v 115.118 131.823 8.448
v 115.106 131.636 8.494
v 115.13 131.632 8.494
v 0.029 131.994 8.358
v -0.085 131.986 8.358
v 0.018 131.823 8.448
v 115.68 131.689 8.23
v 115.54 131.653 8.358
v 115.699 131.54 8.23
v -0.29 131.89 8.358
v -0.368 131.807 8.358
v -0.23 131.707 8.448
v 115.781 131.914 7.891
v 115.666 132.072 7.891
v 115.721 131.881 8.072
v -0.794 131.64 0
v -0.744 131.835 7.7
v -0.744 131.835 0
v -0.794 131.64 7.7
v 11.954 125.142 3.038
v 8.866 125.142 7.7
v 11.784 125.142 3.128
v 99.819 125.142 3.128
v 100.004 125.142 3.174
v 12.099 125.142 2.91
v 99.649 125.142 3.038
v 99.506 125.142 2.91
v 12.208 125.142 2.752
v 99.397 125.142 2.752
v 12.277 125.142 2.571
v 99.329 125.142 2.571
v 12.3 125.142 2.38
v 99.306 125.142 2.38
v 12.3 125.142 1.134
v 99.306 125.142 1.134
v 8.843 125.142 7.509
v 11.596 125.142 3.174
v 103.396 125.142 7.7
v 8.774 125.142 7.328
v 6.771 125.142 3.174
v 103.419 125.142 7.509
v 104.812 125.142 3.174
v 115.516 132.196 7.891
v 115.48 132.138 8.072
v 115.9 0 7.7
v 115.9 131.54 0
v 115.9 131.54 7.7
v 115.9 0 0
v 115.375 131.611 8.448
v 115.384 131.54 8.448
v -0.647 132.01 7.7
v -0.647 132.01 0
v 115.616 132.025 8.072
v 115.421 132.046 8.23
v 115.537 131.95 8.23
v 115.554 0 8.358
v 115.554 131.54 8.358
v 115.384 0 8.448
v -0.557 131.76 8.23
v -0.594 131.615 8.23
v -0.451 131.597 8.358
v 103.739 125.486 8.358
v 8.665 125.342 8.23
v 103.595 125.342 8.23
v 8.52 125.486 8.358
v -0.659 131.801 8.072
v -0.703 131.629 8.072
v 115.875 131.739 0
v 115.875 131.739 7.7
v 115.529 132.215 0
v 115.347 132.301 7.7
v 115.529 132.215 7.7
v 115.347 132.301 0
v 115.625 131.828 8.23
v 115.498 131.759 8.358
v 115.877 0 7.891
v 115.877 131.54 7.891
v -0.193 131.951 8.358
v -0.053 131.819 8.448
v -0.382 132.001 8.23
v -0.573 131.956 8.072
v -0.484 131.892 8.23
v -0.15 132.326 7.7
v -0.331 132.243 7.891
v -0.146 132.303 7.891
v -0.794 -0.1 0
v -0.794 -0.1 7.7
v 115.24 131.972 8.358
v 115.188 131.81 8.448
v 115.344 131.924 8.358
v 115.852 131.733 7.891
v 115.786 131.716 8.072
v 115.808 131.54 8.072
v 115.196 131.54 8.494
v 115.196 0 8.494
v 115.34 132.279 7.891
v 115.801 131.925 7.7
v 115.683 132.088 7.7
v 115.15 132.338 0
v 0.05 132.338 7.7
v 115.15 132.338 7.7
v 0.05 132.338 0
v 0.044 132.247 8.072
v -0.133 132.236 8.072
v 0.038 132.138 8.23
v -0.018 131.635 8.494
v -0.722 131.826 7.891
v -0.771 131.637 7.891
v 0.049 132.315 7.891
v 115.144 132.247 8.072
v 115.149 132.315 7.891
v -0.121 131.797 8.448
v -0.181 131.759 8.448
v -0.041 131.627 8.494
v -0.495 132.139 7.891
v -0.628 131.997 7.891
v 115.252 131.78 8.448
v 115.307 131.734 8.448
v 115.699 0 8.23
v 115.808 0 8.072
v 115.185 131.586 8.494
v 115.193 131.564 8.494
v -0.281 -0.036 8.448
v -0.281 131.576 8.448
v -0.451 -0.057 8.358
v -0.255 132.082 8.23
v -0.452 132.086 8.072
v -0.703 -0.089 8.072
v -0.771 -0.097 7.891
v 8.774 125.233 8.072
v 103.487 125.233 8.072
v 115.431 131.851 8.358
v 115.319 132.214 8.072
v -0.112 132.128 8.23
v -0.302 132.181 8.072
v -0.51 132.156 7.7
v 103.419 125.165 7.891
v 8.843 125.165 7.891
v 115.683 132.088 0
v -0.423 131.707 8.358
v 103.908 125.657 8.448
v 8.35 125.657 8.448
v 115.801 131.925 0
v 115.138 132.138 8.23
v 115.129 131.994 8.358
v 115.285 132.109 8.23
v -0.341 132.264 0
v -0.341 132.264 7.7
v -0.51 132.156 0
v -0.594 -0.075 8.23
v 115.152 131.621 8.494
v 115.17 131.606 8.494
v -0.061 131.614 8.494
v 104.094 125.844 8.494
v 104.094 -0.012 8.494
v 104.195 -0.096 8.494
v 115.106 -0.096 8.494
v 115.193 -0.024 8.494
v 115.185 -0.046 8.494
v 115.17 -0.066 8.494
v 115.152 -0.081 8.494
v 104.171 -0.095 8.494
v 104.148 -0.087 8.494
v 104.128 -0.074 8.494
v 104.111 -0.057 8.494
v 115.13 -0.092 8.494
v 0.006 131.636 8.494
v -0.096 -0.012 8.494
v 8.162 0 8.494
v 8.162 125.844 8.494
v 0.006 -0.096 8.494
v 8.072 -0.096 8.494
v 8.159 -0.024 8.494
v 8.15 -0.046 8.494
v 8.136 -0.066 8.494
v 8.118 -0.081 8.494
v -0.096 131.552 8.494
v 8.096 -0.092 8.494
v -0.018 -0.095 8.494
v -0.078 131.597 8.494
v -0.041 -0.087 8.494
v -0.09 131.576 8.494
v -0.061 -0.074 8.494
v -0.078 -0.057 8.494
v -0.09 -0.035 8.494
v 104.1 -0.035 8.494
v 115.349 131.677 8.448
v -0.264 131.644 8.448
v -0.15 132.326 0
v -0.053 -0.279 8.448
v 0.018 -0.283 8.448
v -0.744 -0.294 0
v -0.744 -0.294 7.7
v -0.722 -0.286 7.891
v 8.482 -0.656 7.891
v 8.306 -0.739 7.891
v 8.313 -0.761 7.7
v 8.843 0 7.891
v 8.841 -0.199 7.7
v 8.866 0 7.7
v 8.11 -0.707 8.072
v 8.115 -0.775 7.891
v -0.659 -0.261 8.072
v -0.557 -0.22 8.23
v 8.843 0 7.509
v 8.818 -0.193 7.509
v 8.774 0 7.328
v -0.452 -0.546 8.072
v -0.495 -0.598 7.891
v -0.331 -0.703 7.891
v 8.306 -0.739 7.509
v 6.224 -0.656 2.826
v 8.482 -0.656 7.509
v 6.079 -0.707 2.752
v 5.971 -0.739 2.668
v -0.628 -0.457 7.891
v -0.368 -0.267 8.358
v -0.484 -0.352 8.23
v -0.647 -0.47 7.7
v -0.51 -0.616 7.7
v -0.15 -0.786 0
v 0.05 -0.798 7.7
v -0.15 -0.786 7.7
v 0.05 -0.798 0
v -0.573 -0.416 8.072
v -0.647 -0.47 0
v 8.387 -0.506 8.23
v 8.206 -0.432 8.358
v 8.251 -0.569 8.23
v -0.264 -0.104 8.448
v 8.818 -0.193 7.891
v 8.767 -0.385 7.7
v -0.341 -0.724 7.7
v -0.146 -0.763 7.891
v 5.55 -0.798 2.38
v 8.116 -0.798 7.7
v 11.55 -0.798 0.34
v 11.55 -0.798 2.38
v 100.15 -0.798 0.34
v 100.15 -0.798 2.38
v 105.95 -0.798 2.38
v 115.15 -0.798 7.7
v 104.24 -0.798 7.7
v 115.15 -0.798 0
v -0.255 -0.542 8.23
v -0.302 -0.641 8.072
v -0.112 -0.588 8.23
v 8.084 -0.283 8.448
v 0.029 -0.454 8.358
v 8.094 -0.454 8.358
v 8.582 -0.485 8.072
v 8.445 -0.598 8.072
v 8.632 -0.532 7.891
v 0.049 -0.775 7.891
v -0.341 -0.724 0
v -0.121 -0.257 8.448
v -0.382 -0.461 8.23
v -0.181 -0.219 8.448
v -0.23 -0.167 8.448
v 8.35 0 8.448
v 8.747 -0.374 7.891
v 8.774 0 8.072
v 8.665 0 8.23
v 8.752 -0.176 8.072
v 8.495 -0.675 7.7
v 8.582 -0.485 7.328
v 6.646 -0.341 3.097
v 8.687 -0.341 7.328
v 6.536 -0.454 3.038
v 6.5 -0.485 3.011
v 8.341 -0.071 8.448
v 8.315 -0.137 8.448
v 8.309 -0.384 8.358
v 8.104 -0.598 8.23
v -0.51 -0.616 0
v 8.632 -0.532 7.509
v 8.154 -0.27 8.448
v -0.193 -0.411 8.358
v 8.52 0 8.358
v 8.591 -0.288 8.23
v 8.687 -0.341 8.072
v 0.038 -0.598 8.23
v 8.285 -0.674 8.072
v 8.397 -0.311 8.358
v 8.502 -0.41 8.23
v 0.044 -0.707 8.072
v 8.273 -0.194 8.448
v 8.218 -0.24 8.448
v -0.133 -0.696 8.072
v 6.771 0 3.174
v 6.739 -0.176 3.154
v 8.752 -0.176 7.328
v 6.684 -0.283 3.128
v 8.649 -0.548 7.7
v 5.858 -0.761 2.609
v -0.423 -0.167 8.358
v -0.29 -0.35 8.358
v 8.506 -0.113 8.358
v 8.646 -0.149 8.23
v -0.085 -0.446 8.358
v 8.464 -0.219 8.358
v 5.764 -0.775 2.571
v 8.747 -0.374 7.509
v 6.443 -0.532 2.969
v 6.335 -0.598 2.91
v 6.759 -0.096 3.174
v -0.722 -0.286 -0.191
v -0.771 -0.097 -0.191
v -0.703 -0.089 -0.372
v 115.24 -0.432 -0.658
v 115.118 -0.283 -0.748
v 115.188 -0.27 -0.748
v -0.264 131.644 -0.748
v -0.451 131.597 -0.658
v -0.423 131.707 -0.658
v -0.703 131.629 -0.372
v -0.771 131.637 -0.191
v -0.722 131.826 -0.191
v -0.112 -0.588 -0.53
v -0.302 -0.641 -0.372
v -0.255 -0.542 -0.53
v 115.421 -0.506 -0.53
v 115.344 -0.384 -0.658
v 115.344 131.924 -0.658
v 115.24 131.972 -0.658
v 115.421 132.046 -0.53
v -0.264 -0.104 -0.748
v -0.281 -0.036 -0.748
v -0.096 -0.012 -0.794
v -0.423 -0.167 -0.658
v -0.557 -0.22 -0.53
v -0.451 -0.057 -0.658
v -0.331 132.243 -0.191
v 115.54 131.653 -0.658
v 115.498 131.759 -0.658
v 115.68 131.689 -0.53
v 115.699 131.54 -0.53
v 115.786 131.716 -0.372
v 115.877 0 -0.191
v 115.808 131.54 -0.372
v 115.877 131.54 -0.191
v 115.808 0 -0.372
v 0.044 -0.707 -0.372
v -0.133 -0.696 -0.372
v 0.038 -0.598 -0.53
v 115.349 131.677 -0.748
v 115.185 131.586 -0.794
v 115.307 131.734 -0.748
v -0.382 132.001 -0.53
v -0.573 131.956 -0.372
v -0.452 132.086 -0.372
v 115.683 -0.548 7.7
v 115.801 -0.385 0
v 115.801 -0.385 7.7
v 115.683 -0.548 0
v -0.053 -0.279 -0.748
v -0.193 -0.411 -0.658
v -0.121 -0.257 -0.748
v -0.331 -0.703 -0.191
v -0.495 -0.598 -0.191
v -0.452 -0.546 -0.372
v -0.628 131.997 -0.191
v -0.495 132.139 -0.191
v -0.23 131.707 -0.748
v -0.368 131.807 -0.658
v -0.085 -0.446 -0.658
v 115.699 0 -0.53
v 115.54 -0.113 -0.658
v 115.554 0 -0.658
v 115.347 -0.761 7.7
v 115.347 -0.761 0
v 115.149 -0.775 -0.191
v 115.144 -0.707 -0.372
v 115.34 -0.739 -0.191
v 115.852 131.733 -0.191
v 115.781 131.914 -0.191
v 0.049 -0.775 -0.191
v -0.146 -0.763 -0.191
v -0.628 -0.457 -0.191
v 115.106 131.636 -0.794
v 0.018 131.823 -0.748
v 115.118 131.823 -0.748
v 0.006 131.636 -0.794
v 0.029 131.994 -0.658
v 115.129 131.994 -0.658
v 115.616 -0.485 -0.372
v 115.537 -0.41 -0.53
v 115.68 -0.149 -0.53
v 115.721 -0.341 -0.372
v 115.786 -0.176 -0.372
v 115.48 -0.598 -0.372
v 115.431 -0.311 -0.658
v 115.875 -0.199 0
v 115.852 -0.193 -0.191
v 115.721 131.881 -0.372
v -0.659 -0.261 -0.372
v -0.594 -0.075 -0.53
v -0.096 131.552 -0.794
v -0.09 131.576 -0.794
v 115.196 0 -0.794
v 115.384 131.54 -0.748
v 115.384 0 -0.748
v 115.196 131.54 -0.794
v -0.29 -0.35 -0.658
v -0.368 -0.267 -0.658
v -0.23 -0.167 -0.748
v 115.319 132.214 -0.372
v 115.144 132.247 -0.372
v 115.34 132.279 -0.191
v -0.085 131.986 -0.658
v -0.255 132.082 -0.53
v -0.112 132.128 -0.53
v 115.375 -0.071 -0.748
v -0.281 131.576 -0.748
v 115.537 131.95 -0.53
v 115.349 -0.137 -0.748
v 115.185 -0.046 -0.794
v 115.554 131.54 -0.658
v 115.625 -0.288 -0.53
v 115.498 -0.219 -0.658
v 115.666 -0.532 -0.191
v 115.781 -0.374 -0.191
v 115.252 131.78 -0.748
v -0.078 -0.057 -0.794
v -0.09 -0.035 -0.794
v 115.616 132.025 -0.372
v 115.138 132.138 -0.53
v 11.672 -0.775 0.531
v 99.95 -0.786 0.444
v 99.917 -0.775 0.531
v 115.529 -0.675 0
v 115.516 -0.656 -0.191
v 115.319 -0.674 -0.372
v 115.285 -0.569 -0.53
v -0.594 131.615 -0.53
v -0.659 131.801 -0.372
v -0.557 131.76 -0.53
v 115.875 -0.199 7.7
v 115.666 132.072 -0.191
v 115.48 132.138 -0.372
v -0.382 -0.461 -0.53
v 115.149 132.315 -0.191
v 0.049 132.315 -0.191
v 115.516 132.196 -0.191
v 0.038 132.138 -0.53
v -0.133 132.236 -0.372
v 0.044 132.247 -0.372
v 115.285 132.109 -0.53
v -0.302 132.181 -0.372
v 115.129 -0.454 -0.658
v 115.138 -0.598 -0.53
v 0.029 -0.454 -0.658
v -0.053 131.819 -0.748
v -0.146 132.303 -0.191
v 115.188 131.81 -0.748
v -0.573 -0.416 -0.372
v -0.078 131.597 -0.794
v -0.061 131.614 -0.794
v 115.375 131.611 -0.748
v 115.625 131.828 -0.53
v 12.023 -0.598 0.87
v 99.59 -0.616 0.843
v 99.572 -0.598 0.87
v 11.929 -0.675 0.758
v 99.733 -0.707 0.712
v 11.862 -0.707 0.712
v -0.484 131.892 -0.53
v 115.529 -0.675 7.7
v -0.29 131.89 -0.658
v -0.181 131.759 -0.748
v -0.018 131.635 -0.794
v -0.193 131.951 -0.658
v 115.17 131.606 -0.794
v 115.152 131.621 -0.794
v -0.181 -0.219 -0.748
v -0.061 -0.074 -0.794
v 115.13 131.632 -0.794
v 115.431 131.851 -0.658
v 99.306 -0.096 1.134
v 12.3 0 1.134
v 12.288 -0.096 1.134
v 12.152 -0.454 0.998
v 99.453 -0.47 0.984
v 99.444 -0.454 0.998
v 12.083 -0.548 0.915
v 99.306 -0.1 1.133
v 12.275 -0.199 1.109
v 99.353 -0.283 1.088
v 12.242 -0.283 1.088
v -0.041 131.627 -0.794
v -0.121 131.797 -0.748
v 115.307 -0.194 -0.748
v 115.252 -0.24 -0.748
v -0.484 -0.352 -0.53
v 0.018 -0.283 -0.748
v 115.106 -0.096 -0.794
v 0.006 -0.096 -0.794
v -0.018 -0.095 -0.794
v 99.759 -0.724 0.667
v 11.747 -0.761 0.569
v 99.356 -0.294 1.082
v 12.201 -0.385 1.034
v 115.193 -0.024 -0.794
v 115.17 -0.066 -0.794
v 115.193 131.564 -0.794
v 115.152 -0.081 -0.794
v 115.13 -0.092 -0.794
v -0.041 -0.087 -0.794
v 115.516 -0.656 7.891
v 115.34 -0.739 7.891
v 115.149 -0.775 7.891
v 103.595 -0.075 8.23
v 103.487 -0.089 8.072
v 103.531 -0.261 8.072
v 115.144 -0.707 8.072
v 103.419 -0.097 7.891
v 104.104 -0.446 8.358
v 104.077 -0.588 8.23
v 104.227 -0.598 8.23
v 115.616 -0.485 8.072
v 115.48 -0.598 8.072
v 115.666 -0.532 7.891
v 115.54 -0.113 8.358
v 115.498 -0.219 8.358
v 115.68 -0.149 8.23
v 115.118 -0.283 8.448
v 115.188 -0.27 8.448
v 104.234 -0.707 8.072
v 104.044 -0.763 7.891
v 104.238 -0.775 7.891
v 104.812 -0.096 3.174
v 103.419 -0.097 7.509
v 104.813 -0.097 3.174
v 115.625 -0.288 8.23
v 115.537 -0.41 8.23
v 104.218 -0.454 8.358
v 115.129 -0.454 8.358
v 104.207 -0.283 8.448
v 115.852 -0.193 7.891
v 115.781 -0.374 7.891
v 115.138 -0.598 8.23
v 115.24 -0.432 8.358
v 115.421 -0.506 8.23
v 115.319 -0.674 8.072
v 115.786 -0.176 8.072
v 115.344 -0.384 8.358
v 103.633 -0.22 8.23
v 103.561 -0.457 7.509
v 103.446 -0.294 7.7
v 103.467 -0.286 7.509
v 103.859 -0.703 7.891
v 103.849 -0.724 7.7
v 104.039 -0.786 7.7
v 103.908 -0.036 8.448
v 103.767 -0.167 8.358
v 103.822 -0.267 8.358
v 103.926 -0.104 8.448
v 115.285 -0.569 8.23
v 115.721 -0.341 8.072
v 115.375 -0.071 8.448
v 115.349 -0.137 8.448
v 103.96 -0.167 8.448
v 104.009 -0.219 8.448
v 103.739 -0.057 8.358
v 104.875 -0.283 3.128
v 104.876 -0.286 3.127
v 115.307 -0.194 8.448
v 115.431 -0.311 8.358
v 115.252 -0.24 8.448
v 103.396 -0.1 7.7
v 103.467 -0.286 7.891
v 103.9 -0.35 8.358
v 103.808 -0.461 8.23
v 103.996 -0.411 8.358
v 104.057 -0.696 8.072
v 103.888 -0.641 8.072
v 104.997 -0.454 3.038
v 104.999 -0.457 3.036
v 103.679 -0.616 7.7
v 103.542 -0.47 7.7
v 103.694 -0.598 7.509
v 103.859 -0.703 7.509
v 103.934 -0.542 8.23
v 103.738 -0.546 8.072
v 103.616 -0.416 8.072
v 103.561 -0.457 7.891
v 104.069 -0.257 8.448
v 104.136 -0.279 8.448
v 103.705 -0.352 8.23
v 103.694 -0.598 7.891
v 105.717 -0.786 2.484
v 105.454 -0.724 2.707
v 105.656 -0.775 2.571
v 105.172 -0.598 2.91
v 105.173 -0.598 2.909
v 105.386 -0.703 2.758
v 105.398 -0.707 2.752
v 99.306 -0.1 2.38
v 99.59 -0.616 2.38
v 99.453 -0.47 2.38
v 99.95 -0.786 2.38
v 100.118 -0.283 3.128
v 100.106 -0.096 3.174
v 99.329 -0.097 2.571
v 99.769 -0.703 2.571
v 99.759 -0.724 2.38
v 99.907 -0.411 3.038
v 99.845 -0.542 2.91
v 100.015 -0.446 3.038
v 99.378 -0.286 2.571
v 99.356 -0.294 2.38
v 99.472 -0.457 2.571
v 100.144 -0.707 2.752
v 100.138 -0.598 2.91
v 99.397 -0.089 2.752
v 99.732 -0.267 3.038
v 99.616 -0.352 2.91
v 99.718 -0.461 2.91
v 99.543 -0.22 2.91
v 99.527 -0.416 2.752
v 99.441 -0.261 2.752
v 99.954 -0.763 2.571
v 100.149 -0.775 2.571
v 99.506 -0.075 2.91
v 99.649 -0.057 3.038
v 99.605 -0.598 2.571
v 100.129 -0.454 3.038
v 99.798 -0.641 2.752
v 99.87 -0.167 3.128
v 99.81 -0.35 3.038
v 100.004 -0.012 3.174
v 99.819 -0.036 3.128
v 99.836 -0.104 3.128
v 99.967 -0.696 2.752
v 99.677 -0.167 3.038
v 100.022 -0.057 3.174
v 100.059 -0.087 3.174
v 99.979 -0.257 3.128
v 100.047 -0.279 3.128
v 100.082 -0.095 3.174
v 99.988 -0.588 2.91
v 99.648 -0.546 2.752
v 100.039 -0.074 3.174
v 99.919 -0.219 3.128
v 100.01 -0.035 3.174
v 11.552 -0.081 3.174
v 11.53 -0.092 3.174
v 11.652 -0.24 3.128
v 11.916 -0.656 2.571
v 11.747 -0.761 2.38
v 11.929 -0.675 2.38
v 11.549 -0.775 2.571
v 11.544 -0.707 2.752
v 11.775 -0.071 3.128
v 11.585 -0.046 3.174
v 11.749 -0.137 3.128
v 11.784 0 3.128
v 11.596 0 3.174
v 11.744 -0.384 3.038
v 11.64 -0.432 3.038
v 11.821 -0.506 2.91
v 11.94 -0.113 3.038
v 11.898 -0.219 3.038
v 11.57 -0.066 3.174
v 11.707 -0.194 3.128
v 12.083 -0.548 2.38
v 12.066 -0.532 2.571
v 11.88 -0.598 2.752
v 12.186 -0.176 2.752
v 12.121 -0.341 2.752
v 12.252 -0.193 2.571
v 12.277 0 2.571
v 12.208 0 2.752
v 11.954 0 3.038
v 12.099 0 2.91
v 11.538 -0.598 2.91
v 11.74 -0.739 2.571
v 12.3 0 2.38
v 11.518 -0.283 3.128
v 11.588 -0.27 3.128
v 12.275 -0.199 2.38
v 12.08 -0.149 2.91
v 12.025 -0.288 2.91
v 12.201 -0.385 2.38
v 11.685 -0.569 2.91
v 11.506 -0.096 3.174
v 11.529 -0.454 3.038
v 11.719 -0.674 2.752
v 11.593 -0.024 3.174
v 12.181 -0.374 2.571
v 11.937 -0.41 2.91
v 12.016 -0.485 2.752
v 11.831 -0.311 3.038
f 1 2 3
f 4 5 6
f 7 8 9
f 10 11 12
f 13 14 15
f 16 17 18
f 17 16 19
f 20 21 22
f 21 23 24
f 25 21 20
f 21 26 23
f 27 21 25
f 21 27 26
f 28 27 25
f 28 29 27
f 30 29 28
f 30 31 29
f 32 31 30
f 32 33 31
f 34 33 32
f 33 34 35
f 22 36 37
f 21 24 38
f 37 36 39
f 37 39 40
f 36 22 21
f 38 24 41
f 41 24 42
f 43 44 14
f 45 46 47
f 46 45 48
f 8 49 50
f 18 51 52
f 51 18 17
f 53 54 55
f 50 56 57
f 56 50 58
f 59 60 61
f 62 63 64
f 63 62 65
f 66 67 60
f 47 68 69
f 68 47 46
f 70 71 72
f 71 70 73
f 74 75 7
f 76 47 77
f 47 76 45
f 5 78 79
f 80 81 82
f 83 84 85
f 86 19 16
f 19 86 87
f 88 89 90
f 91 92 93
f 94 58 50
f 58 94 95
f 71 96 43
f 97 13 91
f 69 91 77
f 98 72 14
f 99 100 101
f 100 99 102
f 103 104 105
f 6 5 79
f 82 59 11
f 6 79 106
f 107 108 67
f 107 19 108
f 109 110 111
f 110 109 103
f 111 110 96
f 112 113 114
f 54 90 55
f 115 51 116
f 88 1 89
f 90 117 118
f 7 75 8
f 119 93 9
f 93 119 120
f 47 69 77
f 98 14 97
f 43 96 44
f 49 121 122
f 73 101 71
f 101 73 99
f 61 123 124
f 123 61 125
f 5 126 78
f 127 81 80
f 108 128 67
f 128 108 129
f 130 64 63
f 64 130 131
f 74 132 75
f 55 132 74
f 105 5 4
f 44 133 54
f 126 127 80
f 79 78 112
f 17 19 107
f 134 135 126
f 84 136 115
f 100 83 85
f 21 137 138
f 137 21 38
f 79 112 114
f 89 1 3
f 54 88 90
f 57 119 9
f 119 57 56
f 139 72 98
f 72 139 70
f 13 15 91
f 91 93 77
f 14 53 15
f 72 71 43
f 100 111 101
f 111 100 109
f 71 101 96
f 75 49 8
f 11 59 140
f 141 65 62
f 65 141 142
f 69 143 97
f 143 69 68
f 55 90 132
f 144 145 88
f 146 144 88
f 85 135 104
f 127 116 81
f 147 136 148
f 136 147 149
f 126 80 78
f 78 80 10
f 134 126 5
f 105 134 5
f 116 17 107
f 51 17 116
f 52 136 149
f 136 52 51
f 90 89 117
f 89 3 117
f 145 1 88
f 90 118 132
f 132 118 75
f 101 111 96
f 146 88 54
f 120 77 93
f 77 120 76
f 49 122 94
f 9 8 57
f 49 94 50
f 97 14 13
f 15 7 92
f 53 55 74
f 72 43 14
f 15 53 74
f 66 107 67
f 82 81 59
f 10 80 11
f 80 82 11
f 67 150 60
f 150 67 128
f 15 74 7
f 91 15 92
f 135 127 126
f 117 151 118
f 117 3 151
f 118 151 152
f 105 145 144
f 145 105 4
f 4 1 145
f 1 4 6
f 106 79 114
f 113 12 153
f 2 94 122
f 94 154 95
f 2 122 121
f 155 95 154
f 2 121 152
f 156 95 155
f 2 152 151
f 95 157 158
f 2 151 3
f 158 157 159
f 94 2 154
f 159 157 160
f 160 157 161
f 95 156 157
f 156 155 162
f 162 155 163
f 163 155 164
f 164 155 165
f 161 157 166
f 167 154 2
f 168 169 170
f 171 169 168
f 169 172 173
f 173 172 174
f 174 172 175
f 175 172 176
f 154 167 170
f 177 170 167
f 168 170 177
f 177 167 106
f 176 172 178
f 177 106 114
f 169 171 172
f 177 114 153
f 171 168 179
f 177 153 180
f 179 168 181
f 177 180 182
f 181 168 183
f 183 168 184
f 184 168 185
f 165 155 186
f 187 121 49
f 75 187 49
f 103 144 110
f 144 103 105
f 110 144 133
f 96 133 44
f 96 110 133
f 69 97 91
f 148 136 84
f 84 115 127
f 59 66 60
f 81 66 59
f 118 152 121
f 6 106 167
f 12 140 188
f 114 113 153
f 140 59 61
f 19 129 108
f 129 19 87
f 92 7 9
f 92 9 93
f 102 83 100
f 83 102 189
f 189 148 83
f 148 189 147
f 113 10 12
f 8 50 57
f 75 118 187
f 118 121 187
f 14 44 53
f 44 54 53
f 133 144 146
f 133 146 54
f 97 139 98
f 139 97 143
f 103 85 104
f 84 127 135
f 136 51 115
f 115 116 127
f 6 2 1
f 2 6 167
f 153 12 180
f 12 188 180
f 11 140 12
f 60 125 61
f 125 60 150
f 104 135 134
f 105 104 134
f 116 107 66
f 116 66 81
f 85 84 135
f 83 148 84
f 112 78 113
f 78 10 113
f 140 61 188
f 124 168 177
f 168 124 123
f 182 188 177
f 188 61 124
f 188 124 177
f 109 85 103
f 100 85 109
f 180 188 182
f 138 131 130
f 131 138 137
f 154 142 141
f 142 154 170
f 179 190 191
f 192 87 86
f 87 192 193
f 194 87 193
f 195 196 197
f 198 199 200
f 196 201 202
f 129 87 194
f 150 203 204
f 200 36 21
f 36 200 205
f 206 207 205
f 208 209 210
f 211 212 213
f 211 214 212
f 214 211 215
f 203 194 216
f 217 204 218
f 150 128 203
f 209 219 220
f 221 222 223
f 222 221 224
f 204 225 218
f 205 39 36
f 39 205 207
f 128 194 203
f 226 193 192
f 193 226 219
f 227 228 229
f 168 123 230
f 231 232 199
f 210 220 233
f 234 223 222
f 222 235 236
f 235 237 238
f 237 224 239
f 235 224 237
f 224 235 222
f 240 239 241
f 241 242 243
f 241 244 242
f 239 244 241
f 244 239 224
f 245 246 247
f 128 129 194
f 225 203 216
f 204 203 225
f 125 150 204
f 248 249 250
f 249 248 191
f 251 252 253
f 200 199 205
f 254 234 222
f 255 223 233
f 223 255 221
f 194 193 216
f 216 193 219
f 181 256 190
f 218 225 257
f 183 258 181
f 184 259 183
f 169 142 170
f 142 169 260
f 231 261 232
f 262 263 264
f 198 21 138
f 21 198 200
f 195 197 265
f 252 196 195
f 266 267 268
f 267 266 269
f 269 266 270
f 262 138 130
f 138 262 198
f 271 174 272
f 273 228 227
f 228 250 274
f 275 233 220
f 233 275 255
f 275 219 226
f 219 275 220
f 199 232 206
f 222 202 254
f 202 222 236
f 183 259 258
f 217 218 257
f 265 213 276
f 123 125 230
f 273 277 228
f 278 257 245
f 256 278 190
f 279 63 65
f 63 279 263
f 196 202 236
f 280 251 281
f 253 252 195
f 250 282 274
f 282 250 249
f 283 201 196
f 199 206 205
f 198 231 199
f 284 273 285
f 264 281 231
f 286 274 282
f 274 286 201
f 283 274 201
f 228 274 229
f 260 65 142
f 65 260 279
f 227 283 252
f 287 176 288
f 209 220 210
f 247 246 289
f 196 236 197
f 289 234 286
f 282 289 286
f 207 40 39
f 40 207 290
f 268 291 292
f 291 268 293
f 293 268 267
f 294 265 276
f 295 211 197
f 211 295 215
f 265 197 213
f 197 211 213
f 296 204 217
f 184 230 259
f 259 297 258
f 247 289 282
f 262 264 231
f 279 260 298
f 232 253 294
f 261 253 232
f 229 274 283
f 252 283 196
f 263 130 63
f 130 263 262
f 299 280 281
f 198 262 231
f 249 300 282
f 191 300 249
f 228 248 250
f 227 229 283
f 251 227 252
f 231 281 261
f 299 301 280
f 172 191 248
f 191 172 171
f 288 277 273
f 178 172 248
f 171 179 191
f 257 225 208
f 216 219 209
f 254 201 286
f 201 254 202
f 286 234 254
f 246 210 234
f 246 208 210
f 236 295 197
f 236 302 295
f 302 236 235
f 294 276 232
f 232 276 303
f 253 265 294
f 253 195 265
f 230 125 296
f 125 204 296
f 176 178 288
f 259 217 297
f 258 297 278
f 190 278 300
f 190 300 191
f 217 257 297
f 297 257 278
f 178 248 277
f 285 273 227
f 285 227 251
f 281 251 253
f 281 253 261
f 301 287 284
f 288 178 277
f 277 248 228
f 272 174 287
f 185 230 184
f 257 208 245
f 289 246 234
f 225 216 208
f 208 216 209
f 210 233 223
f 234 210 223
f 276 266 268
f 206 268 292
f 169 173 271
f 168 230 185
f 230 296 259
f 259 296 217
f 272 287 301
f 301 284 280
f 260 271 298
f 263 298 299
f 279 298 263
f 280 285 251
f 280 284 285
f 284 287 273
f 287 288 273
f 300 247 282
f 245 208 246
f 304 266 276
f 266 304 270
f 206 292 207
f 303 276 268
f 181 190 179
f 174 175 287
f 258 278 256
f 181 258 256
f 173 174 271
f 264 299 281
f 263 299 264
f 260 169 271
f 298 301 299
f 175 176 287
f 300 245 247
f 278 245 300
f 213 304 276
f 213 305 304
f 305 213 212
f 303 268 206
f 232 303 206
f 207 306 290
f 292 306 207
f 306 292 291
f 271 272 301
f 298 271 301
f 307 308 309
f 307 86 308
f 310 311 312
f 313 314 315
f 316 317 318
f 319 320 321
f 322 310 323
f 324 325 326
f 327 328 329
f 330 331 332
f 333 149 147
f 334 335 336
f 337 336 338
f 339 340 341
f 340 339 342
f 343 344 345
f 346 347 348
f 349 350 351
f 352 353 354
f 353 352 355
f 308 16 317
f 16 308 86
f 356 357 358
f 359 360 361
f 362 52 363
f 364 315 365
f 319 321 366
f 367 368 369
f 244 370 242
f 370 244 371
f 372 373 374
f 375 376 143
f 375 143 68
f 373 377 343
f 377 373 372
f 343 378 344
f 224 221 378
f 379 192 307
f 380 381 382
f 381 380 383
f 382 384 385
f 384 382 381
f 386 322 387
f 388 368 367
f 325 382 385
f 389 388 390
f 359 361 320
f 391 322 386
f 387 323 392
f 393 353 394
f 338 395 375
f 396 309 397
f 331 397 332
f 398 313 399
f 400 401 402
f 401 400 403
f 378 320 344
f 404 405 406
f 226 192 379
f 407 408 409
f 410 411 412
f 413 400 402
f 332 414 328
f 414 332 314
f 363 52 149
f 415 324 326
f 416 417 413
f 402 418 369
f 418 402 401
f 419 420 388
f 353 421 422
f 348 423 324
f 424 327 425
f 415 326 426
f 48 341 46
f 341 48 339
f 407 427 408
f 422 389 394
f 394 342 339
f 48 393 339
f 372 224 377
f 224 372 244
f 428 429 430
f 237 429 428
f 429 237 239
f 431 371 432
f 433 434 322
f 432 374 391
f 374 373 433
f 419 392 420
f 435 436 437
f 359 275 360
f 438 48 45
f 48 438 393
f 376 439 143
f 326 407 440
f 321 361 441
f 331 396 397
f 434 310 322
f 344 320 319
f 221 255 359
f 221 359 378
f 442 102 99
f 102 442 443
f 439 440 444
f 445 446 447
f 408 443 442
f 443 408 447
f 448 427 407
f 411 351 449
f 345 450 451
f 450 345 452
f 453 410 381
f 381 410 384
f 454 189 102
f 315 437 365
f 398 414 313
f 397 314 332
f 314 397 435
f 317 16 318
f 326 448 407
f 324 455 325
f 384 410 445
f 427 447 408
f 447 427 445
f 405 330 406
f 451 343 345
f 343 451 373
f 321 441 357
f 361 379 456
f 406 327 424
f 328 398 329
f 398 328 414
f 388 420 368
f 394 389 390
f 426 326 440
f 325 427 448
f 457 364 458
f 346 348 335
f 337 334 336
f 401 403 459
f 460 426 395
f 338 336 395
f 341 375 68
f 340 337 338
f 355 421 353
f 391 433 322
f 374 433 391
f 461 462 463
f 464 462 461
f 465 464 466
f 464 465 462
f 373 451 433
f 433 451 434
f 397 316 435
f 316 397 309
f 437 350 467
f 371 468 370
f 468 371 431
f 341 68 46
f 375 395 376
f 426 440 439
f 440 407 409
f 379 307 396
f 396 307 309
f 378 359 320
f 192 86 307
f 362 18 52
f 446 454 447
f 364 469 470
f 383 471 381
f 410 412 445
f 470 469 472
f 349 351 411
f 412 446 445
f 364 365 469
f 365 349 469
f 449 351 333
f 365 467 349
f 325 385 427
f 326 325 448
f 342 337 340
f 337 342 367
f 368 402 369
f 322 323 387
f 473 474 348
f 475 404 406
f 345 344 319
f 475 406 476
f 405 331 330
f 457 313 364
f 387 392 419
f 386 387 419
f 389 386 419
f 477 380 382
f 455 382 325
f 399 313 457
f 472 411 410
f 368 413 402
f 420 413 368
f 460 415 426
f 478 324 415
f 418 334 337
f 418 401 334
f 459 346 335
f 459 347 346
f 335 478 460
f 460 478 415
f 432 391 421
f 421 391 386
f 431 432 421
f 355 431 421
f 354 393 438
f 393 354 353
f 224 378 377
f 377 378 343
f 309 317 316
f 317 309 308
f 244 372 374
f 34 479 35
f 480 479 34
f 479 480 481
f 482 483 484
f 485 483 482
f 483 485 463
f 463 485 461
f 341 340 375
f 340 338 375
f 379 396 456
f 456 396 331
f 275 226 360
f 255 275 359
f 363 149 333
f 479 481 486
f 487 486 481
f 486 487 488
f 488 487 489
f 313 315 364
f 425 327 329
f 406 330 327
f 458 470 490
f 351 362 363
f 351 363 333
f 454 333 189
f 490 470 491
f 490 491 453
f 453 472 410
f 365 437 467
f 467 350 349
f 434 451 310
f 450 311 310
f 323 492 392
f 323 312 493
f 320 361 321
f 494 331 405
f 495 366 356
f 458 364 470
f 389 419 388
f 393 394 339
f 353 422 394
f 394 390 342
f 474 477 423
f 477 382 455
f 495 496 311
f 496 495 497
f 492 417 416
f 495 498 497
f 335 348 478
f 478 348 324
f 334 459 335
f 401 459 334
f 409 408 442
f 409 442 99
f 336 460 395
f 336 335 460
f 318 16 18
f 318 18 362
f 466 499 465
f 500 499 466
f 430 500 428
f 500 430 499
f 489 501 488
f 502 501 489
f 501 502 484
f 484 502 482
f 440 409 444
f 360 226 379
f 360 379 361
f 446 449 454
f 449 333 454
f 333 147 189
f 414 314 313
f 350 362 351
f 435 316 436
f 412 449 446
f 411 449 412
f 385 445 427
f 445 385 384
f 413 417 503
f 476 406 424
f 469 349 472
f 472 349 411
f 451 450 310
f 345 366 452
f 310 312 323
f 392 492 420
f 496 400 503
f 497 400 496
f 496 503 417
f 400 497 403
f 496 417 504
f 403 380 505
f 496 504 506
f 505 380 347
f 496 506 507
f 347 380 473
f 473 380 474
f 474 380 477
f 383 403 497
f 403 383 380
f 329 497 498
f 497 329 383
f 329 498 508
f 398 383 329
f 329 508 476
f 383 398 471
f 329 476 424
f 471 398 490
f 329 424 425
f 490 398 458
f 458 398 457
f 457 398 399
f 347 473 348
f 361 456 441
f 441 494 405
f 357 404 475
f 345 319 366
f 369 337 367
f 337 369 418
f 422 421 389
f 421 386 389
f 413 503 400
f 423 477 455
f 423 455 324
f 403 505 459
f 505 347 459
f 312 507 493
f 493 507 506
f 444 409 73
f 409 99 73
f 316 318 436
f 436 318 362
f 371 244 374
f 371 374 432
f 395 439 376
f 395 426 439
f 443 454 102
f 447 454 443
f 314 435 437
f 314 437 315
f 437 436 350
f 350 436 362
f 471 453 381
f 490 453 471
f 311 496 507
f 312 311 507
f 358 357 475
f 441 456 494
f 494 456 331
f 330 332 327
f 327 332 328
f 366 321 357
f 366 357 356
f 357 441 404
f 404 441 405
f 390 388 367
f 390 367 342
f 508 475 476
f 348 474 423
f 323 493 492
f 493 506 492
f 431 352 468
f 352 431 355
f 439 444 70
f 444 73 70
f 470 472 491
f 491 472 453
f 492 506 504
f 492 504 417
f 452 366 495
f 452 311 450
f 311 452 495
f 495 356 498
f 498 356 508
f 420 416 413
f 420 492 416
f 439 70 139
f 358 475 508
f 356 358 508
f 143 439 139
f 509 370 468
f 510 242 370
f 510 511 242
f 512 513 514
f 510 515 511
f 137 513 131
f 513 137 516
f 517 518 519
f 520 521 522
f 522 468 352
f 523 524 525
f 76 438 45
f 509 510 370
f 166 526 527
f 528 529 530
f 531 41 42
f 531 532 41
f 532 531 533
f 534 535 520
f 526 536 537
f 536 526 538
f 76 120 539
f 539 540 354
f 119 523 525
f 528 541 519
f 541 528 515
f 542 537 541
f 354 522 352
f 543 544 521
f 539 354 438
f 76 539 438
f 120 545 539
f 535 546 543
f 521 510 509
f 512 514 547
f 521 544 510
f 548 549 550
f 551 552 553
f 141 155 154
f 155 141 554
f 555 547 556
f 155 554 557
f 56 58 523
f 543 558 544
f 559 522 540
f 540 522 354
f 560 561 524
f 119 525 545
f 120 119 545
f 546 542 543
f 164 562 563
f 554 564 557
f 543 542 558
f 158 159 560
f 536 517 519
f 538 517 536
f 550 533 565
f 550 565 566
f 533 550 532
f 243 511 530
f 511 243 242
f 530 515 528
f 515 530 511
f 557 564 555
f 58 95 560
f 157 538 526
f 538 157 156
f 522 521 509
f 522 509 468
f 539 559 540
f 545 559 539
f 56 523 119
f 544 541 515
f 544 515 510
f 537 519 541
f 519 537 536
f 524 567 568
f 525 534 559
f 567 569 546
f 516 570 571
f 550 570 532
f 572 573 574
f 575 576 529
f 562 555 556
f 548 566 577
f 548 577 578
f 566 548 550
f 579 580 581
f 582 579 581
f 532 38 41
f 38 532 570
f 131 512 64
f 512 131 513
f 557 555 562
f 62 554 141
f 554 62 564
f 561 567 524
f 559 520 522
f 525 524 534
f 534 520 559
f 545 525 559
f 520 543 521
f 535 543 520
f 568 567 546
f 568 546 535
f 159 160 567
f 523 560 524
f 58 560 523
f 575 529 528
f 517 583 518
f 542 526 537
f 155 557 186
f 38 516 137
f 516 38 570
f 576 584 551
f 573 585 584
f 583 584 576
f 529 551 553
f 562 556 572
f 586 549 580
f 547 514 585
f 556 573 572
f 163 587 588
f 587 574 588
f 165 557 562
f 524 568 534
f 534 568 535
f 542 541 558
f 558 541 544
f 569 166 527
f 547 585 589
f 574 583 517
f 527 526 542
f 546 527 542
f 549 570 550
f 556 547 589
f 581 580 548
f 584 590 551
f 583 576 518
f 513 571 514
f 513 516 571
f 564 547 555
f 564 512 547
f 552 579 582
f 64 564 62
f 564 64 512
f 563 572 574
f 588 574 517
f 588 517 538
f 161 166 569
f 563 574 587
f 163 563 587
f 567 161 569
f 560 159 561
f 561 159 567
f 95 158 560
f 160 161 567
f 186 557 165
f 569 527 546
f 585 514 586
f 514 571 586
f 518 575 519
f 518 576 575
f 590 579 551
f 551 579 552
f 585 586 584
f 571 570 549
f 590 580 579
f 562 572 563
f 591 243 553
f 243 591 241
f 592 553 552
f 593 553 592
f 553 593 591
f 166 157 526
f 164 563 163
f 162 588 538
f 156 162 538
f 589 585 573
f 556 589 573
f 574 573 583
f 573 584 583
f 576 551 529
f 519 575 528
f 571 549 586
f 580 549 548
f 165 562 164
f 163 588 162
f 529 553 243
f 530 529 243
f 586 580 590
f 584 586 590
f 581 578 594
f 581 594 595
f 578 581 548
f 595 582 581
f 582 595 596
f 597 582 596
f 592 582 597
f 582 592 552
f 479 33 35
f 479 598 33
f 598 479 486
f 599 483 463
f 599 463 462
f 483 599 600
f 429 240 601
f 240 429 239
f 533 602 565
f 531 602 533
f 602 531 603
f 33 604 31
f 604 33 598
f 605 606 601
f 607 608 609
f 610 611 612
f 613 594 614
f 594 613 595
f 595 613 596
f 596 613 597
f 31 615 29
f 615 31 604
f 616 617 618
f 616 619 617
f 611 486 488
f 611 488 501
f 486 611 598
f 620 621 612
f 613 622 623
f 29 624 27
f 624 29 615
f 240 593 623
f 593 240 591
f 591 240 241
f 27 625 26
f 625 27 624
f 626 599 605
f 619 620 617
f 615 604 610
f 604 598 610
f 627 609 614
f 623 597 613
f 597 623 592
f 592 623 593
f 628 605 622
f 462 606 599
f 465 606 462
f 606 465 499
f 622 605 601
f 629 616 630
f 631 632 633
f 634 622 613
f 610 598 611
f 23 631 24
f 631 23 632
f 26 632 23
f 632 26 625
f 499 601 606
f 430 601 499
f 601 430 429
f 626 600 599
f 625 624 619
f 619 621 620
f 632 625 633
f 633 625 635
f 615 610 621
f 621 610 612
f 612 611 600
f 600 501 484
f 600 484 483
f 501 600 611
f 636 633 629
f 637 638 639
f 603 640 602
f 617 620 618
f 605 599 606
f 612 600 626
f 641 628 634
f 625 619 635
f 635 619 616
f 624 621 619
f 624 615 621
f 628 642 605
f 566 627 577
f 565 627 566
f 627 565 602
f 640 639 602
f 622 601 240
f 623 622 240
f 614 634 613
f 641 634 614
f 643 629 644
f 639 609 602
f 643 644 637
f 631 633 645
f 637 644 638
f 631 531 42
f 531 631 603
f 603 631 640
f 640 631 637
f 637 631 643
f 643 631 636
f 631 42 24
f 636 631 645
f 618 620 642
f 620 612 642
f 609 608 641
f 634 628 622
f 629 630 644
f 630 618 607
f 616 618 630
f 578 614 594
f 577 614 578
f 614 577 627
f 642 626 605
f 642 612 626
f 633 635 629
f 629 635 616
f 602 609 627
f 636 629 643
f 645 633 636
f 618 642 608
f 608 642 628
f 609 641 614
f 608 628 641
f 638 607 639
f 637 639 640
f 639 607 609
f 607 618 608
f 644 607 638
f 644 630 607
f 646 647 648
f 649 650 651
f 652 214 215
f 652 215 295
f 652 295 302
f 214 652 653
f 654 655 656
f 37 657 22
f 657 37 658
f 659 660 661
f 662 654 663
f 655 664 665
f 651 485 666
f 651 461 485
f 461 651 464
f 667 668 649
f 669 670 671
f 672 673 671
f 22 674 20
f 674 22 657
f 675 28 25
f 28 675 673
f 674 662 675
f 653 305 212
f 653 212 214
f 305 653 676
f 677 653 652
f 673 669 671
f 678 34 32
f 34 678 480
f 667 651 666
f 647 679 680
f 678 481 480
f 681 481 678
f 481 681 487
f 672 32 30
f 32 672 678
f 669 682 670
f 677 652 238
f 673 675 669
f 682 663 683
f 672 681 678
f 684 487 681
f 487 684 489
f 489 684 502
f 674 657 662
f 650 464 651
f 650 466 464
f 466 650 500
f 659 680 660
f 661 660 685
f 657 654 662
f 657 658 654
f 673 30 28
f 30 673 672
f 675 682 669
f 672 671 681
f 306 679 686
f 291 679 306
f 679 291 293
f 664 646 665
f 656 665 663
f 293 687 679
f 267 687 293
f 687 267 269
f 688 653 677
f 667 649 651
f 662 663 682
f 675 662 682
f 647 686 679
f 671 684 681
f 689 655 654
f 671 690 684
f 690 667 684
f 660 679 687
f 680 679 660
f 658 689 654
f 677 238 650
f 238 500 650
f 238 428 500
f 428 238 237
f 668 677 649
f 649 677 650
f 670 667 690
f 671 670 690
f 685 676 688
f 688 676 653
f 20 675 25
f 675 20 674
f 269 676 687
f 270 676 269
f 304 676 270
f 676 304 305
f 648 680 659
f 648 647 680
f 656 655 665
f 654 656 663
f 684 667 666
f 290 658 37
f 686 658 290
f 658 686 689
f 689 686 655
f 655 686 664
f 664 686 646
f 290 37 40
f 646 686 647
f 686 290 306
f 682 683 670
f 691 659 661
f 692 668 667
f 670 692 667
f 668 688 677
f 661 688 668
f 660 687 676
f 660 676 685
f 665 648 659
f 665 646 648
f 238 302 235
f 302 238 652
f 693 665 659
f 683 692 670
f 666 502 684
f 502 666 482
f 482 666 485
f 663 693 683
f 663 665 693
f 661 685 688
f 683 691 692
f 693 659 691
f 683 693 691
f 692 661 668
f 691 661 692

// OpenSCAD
spherulation = 0.8;

width=97;
width_spheruled = width + 2*spherulation;
height=120.54;
margins = 5.5;
cut_in_margins = 3;
lip_depth=1;
board_depth=1.54;
cut_margin=0.1;
depth_holder = 5*board_depth;

module board(margins) {
    color("red") translate([2*margins-2.5,0,2.5*board_depth-spherulation]) cube([width,height, board_depth]);
}


module prismatic_cut(margins) {
    translate([0,height+margins-0.1,0]) rotate([90,0,0]) linear_extrude(height+margins+10) {
        polygon(points=[
        [0,0], 
        [width_spheruled+spherulation+1,0],
        [width_spheruled+spherulation-1,3*board_depth+2*spherulation],
        [3, 3*board_depth+2*spherulation],
        [0,0]]);
    }
}

module holder(margins) {
    difference() {
     cube([width_spheruled+3*margins, height+2*margins, depth_holder]);
       translate([margins,0,2*board_depth-spherulation+cut_margin]) prismatic_cut(margins);
        // for solder joints
        translate([margins+1+5, -0.1, 1*board_depth-1.5*spherulation]) cube([width_spheruled-10,height+1*margins, 2*spherulation+board_depth*2]);
     
    }
}


//board();
module rounded(margins) {
    minkowski() {
      holder(margins);
      sphere(spherulation, $fn=25);
    }
}


module test() {
    for (margins=[2:0.5:5]) {
           rotate([90,0,0]) translate([0,margins*30,0]) {
               difference() { 
                   rounded(margins);
                   translate([50,0,0]) linear_extrude(1.2) text(str(margins), size=3);
                   translate([-10,3,-10]) cube([1000,1000,100]);
               }
           }
        }
}

rounded(margins);
//test();
//prismatic_cut();
